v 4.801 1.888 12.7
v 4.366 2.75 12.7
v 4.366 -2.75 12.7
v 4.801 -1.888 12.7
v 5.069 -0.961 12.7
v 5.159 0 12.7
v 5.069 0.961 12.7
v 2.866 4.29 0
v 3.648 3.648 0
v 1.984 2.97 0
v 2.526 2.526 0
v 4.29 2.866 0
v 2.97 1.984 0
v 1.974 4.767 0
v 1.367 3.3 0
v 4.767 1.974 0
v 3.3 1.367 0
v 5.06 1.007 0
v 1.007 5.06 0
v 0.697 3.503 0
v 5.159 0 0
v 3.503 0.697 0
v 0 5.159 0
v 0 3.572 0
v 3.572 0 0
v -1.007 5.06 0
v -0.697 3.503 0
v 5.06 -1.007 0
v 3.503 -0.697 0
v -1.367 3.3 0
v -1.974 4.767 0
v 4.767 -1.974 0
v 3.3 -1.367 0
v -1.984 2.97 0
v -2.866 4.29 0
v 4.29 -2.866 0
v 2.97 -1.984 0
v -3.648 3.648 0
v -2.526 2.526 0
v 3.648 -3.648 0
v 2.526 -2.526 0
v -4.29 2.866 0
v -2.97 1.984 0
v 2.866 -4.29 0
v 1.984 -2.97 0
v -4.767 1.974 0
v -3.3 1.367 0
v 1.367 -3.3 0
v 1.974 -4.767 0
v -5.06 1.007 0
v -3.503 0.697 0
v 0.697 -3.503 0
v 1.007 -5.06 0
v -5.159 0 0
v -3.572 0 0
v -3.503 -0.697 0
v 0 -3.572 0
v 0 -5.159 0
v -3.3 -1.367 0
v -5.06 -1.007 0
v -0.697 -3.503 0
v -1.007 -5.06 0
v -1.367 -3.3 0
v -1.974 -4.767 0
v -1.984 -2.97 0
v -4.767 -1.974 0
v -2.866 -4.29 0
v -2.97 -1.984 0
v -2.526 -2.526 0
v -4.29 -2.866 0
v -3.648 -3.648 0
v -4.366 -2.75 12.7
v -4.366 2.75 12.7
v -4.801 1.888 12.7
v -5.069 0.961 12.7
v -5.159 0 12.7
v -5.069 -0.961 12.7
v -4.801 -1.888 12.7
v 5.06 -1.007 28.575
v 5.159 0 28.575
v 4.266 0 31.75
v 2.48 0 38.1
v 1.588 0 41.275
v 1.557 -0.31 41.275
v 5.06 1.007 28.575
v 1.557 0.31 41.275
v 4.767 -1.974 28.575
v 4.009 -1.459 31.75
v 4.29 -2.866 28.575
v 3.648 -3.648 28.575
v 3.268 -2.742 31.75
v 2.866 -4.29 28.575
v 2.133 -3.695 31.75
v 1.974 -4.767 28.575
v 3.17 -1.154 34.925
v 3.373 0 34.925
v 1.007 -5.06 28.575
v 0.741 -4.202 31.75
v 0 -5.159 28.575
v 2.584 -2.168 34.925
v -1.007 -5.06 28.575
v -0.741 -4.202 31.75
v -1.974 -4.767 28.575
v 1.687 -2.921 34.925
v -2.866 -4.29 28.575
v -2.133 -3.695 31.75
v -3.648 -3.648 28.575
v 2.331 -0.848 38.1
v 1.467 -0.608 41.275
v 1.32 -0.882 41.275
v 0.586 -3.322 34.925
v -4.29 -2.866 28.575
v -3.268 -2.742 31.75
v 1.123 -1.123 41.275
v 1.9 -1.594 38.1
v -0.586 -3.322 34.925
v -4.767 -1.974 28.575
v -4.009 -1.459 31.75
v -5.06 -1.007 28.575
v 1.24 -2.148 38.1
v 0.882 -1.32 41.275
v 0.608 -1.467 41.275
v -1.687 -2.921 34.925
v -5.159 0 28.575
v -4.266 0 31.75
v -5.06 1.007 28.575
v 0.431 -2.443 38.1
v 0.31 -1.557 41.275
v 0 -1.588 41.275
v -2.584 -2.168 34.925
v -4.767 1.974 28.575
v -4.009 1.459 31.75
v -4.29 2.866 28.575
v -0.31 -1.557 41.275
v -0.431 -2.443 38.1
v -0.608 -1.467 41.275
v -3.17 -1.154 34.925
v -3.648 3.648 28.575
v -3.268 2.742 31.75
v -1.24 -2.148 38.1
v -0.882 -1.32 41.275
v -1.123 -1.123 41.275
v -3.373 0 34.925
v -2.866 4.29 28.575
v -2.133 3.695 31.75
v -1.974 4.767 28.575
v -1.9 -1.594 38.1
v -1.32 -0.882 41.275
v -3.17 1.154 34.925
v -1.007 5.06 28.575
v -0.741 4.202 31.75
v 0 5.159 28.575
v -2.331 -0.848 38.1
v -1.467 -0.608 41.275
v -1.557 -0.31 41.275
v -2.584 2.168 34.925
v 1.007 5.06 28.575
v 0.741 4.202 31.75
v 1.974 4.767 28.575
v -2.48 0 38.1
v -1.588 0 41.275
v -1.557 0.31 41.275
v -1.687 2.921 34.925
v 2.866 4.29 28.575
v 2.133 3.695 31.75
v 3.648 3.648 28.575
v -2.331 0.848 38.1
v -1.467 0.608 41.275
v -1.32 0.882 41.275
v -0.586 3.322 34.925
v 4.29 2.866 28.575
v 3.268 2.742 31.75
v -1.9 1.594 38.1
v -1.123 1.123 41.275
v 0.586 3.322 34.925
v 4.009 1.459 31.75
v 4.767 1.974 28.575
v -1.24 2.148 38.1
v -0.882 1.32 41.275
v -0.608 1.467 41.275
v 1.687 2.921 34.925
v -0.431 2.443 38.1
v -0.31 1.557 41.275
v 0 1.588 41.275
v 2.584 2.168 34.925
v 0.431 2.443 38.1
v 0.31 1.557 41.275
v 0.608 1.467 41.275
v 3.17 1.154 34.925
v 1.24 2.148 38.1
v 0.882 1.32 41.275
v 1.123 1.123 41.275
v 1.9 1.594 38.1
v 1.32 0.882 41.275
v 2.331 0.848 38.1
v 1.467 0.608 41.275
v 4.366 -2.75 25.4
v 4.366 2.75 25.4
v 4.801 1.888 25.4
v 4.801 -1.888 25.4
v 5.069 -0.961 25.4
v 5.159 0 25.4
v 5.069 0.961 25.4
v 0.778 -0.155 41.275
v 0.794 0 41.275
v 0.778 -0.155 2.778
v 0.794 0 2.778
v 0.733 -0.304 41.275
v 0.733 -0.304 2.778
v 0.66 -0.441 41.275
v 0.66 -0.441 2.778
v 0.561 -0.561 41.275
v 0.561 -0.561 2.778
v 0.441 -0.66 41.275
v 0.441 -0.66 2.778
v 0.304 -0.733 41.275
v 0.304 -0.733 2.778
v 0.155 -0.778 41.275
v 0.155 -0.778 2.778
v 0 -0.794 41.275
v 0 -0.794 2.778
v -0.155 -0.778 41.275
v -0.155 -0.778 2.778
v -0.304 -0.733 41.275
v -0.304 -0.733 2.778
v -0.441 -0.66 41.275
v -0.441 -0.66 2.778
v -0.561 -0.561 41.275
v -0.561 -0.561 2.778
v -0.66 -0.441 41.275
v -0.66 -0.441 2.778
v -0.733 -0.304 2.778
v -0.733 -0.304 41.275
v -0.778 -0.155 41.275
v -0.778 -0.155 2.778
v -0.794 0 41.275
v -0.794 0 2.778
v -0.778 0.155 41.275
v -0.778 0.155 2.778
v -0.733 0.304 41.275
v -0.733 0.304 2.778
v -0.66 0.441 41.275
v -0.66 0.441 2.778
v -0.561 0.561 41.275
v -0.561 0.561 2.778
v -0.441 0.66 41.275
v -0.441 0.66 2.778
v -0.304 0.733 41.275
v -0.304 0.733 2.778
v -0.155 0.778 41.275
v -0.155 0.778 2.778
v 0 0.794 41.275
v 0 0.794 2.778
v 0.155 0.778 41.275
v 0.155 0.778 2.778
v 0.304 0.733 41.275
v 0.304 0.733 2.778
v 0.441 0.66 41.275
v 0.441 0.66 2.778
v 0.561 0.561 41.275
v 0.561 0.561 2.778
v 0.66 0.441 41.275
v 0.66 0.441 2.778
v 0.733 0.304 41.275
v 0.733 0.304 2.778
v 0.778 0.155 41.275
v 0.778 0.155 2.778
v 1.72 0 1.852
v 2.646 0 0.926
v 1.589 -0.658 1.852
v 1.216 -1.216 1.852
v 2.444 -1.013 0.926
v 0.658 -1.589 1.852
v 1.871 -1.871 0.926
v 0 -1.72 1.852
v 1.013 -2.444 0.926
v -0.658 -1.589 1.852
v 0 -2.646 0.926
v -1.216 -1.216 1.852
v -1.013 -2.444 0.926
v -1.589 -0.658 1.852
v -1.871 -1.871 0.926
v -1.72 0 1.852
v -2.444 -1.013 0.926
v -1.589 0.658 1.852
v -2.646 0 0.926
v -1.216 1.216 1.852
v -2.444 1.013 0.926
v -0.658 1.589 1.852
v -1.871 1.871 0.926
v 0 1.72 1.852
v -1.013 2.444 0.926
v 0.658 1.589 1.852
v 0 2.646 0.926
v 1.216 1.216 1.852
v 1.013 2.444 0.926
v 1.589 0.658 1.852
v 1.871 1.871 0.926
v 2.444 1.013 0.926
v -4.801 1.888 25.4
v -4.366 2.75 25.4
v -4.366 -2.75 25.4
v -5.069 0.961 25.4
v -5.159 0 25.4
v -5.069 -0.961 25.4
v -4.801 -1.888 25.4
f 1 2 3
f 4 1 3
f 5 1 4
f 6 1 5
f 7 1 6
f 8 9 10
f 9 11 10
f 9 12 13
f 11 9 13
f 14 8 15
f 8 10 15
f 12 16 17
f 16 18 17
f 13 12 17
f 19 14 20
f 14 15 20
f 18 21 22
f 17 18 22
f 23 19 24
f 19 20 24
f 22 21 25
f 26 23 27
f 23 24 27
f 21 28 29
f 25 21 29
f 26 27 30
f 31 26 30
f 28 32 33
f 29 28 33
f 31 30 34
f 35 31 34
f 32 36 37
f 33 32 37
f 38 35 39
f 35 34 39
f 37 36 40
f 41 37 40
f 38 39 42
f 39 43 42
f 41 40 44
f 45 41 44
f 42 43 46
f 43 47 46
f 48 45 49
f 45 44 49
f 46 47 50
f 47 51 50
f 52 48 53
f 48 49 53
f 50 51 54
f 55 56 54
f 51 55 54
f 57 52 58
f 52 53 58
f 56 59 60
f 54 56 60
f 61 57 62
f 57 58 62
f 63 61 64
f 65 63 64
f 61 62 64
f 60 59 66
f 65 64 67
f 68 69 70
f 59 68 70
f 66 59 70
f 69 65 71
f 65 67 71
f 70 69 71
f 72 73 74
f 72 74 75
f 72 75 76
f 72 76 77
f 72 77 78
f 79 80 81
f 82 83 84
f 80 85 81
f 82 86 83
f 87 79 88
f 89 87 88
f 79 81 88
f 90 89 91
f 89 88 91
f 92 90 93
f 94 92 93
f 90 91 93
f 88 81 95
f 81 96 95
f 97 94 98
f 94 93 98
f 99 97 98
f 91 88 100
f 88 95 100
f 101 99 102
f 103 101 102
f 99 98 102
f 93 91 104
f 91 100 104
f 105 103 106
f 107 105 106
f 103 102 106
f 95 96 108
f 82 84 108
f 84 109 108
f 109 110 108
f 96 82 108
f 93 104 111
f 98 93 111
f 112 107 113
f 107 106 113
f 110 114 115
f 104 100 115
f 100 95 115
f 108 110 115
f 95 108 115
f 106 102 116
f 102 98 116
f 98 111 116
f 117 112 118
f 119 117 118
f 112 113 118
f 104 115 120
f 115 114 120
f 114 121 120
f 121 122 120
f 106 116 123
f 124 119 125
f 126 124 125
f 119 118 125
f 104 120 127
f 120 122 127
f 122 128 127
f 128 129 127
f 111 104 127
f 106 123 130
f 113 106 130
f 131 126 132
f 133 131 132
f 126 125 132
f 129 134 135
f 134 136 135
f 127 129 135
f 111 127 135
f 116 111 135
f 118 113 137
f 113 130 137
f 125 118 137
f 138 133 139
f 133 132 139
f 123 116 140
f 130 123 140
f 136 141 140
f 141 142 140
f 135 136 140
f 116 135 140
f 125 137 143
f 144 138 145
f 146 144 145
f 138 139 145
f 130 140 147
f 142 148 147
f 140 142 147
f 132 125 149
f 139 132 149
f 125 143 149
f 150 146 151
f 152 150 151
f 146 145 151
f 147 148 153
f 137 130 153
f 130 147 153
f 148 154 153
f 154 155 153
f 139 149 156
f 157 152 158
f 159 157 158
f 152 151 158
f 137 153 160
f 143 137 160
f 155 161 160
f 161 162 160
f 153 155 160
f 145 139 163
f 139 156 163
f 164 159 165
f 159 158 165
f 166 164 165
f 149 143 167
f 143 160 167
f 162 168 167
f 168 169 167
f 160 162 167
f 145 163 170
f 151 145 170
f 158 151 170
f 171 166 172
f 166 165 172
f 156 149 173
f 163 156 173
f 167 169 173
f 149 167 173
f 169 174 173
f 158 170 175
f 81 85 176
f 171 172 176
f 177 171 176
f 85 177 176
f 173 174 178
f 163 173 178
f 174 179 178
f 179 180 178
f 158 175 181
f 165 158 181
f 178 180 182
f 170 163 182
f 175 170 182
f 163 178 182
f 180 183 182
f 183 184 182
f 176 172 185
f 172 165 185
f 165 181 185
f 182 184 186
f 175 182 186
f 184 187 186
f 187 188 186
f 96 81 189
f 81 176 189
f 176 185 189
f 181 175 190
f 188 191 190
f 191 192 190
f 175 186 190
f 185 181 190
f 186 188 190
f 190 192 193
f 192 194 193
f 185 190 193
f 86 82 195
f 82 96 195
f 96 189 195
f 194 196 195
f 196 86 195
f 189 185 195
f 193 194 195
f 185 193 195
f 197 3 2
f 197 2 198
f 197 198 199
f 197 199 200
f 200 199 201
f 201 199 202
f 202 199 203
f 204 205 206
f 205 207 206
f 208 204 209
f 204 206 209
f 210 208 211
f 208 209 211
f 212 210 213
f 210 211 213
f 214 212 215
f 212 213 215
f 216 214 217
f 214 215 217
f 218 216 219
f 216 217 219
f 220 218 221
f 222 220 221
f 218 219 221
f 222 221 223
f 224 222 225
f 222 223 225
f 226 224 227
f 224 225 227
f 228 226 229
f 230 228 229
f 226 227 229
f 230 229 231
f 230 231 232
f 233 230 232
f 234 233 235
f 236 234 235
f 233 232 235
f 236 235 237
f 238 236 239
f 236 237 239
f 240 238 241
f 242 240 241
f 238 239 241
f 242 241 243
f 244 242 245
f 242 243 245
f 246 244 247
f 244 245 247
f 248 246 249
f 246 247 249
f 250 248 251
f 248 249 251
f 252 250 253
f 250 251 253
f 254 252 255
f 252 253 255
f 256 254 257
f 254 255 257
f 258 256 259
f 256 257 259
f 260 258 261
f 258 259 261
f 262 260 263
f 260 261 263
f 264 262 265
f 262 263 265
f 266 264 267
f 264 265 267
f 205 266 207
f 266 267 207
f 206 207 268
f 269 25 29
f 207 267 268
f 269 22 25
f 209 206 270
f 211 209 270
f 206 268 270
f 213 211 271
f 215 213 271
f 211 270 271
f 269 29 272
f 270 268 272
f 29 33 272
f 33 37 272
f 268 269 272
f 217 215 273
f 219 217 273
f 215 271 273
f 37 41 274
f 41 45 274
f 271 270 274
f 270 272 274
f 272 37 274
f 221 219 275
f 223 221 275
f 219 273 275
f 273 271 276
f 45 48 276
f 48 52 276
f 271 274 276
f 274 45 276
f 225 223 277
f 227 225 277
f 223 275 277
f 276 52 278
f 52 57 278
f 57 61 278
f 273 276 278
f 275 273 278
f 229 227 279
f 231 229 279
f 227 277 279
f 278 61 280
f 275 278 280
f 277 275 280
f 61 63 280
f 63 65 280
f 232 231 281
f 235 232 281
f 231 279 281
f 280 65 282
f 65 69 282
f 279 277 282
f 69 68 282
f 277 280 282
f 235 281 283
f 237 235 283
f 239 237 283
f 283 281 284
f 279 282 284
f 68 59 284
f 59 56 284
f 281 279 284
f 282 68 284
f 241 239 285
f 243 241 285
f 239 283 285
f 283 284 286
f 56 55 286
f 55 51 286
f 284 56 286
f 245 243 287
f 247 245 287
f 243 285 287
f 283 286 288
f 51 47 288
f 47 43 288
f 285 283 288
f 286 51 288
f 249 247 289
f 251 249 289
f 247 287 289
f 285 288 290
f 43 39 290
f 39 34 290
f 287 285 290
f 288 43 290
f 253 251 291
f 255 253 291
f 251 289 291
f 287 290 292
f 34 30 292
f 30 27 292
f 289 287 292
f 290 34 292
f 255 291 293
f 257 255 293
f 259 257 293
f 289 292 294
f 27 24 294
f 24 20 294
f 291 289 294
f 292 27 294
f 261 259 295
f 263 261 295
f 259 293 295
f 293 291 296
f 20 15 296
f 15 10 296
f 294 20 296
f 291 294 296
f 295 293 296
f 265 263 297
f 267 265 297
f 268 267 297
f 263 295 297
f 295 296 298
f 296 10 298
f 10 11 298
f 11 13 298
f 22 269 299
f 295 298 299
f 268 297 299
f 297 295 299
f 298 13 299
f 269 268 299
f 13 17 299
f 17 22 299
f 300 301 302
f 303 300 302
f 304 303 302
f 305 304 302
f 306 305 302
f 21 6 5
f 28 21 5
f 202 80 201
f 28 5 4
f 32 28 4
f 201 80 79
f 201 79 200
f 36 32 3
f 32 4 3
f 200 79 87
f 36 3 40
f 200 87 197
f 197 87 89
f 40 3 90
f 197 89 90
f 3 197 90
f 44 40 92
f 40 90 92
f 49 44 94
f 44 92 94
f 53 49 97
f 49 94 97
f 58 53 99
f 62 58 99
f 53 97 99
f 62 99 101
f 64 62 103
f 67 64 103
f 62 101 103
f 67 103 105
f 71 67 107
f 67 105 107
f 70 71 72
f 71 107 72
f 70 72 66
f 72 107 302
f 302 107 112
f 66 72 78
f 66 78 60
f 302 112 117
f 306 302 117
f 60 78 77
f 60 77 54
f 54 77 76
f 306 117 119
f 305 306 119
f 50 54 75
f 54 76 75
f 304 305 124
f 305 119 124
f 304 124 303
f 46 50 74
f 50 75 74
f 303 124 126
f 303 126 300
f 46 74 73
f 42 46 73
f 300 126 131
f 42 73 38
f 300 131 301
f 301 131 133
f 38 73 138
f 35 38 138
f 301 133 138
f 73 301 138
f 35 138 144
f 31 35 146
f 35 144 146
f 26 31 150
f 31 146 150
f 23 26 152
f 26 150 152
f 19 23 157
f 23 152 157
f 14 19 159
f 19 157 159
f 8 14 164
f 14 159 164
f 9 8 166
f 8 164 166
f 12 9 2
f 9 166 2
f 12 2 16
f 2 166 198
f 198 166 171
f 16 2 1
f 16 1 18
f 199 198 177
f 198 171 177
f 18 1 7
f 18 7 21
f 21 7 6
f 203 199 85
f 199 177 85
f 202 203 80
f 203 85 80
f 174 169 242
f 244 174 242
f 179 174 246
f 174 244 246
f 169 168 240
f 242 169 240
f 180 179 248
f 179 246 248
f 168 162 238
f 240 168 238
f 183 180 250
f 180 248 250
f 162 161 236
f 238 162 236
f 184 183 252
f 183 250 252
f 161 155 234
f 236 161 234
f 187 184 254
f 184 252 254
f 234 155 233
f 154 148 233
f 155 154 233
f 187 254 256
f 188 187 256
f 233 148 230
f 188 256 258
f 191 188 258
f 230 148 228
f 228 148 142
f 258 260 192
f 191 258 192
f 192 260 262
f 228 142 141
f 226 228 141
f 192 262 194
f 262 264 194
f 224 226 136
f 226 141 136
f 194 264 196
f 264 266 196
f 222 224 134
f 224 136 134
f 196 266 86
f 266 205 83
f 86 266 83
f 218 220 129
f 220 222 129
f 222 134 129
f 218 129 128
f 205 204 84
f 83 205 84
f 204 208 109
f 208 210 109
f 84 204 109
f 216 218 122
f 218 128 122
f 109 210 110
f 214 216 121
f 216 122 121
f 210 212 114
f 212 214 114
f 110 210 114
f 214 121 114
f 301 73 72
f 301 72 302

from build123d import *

# Parameters (mm, degrees)
F2_W     = 0.79375
F2_H     = 12.7
F3_DEPTH = 12.7


with BuildPart() as f1:
    # F0 (on Front) → F1 (revolve)
    with BuildSketch(Plane.XZ):
        Polygon((3.571875, 0), (5.159375, 0), (5.159375, 28.575), (1.5875, 41.275), (0.79375, 41.275), (0.79375, 2.778125), align=None)
    revolve(axis=Axis((0, 0, 23.459722), (0, 0, -1)))

    # F2 (on Front) → F3 (cut, symmetric)
    with BuildSketch(Plane.XZ):
        with Locations((-4.7625, 19.05)):
            Rectangle(F2_W, F2_H)
        with Locations((4.7625, 19.05)):
            Rectangle(F2_W, F2_H)
    extrude(amount=F3_DEPTH, both=True, mode=Mode.SUBTRACT)


solid = f1.part
